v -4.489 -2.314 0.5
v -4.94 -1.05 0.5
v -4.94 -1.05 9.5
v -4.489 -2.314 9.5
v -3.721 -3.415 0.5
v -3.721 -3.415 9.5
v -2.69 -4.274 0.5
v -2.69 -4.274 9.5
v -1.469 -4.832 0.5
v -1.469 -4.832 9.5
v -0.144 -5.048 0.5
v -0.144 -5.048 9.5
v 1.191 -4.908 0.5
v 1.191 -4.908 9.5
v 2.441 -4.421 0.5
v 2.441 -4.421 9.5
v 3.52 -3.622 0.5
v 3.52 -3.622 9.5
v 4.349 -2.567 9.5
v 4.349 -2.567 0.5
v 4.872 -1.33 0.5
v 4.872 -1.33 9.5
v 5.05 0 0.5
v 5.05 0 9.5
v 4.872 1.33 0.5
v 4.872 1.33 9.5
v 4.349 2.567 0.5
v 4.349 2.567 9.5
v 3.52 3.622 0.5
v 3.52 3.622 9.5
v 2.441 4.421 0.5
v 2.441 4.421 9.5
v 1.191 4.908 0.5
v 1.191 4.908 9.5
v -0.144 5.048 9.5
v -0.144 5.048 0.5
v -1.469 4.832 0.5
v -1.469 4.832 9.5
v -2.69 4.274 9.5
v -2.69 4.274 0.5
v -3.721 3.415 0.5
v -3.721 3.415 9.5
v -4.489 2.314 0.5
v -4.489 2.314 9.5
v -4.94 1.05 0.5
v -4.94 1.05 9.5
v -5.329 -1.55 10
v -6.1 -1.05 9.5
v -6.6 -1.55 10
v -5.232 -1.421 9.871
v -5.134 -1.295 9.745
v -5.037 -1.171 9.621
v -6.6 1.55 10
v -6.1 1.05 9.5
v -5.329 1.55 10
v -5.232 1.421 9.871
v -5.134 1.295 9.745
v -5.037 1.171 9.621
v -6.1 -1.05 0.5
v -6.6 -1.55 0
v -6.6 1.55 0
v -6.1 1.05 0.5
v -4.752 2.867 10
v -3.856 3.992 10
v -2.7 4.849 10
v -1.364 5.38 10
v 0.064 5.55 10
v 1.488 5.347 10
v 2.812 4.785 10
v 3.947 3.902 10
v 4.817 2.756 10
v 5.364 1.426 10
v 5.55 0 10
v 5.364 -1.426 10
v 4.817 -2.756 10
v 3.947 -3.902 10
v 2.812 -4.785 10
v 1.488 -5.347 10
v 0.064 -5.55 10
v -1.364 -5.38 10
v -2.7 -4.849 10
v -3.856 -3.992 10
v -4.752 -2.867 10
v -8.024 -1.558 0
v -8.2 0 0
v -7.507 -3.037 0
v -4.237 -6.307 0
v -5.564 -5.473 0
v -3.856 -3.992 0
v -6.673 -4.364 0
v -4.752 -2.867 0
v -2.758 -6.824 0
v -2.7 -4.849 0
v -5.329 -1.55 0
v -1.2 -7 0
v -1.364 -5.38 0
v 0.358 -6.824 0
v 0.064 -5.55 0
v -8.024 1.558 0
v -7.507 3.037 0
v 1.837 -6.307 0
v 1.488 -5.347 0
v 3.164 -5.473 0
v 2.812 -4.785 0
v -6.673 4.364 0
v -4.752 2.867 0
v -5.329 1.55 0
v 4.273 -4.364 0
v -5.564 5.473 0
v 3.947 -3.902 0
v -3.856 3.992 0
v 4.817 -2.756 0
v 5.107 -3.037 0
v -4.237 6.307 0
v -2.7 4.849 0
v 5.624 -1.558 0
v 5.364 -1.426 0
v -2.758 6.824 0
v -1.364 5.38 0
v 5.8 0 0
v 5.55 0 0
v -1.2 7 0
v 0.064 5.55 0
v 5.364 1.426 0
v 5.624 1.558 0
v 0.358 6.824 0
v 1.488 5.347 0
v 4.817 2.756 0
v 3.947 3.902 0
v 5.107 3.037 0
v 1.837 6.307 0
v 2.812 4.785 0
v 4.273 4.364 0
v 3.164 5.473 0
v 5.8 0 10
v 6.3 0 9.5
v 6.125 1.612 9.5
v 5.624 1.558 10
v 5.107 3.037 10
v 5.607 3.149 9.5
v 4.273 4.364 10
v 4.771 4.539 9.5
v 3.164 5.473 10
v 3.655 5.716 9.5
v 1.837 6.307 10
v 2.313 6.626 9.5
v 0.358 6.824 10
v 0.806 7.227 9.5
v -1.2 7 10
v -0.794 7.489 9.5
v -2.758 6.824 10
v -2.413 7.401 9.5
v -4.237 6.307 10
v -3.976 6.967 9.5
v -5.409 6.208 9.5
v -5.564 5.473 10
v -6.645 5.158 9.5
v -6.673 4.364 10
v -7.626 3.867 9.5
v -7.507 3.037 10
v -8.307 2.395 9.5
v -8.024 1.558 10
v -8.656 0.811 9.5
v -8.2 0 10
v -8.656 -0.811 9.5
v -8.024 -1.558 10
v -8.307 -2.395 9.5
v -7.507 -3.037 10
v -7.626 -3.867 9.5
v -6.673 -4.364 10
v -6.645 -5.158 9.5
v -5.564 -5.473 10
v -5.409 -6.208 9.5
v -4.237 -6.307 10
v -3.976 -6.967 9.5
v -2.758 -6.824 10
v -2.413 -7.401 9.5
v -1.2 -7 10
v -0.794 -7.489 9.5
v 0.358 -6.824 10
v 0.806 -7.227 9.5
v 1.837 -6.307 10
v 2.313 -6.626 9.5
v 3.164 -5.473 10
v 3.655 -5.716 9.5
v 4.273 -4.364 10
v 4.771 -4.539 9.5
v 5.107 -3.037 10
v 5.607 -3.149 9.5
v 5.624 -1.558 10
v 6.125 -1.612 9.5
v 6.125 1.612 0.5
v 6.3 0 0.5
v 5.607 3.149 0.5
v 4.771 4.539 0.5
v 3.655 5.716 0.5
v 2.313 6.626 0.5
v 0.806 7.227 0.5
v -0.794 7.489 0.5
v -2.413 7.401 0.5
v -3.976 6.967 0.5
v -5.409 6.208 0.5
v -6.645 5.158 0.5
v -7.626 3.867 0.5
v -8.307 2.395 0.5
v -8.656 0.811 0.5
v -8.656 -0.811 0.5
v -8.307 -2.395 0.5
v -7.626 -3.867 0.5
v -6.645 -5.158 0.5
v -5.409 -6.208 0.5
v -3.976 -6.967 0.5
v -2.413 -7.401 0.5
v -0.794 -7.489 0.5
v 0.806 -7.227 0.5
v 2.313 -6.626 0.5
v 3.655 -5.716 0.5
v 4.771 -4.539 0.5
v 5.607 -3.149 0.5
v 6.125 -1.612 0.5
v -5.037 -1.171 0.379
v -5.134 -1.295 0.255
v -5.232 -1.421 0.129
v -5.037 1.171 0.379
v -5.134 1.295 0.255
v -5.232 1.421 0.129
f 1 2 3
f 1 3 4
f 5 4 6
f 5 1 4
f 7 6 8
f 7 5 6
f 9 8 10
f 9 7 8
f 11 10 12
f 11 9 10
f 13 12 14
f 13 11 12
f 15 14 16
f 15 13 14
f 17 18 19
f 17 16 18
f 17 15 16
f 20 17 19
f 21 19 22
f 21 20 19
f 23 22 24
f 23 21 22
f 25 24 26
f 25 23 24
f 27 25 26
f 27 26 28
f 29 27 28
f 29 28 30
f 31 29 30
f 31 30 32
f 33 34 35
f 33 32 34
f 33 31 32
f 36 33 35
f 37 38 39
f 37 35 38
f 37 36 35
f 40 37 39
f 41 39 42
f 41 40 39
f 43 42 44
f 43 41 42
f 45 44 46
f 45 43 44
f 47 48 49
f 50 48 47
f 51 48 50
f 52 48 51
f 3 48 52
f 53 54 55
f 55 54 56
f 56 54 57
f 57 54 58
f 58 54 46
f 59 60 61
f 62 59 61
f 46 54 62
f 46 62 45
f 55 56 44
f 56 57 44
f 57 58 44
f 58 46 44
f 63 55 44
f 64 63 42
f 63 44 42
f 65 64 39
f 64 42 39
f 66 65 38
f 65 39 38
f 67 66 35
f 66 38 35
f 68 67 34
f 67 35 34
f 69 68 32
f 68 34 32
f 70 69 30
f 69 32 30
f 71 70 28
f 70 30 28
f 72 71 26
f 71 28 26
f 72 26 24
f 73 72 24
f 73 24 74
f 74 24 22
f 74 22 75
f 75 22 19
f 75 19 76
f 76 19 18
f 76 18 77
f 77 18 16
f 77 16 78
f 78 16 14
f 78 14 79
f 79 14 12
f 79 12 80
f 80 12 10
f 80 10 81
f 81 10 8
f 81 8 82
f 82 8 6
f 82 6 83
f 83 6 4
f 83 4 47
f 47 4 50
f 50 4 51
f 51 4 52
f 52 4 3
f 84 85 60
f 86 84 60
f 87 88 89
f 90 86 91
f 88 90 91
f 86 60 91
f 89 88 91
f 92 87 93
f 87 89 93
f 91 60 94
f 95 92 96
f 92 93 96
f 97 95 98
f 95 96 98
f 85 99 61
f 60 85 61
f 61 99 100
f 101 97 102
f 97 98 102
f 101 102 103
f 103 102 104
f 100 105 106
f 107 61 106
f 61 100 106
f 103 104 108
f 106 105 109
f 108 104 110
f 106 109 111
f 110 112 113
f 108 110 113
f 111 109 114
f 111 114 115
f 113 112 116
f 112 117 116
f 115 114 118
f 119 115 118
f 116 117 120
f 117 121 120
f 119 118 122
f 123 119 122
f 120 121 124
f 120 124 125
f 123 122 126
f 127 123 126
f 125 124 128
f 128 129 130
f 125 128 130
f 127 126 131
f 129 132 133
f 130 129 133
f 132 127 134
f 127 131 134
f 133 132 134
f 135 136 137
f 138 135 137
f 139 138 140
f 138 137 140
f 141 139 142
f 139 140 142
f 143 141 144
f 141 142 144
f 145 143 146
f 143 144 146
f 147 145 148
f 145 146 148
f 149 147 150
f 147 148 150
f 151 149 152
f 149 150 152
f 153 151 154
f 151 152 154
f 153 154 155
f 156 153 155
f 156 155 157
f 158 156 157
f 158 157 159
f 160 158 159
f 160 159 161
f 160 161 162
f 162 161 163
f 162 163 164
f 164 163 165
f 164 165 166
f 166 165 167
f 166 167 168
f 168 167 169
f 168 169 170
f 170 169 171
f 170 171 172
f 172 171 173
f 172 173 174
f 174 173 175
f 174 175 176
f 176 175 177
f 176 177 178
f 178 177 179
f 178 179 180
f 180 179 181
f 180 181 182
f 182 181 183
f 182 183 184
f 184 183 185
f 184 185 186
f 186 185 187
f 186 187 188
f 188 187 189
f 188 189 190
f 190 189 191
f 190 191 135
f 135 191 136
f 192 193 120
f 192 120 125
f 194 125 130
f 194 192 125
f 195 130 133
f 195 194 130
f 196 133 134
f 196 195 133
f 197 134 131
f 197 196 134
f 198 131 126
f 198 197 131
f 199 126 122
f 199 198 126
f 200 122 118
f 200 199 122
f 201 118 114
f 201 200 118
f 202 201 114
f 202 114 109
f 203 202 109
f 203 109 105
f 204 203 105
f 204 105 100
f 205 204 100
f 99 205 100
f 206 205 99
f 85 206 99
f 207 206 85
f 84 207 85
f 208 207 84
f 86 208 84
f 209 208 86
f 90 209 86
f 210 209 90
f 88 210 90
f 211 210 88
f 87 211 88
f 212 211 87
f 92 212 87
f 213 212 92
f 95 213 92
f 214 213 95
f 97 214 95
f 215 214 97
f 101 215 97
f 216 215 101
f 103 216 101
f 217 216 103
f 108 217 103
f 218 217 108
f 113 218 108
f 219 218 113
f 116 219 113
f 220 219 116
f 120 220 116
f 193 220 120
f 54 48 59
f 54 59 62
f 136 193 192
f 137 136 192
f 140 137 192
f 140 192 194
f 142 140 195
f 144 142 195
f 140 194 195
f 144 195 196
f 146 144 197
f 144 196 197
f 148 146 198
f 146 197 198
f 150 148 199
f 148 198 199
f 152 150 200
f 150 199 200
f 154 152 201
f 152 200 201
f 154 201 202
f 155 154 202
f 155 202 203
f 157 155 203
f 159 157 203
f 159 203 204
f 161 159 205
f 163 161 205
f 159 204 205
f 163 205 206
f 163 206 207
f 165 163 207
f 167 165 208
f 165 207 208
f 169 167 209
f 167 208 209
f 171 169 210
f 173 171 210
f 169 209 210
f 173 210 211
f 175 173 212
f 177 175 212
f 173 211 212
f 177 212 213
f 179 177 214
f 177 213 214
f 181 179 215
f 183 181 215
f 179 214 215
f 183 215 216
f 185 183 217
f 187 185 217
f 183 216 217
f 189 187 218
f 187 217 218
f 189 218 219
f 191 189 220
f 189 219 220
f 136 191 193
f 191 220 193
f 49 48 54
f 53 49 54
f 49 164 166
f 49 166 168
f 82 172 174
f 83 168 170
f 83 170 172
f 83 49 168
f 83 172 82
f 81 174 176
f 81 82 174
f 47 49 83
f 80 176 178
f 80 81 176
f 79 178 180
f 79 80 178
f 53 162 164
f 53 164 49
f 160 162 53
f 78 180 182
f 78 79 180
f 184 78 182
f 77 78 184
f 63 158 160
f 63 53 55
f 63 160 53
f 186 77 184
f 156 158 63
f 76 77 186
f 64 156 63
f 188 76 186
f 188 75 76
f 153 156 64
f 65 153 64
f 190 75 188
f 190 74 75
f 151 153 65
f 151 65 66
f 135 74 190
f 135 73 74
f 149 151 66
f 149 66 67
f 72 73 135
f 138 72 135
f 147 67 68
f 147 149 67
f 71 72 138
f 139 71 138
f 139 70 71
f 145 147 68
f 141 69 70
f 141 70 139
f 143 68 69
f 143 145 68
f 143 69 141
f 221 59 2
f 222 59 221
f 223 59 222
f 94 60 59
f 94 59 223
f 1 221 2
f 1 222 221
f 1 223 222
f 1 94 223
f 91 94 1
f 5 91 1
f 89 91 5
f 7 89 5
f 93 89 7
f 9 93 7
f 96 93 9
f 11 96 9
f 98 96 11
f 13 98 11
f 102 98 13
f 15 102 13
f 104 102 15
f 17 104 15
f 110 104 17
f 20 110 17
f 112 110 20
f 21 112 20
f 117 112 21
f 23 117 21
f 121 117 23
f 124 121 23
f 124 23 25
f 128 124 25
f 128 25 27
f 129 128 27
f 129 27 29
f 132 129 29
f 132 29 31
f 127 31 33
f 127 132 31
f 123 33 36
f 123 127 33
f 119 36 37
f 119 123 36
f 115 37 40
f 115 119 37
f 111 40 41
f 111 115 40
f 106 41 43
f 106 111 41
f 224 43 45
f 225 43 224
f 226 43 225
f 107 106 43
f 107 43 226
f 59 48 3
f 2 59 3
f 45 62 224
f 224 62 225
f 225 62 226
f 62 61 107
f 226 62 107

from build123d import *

# Parameters (mm, degrees)
SKETCH1_R           = 7.5
SKETCH1_R_2         = 5.05
BOSS_EXTRUDE1_DEPTH = 10
SKETCH2_W           = 6.1
SKETCH2_H           = 2.1
CUT_EXTRUDE1_DEPTH  = 16.229576488
CHAMFER1_SIZE       = 0.5
CHAMFER2_SIZE       = 0.5
CHAMFER3_SIZE       = 0.5


with BuildPart() as part:
    # Sketch1 → Boss-Extrude1 (new body)
    with BuildSketch(Plane.XY):
        with Locations((-1.2, 0)):
            Circle(SKETCH1_R)
        Circle(SKETCH1_R_2, mode=Mode.SUBTRACT)
    extrude(amount=BOSS_EXTRUDE1_DEPTH)

    # Sketch2 → Cut-Extrude1 (cut, through all)
    with BuildSketch(Plane.XY.offset(10)):
        with Locations((-3.05, 0)):
            Rectangle(SKETCH2_W, SKETCH2_H)
    extrude(amount=-CUT_EXTRUDE1_DEPTH, mode=Mode.SUBTRACT)

    # Chamfer1
    chamfer1_edges = [part.edges().sort_by_distance(p)[0] for p in [
        (5.05, 0, 10),
        (-5.519817807, -1.05, 10),
        (-5.519817807, 1.05, 10),
        (-6.1, 0, 10),
    ]]
    chamfer(chamfer1_edges, length=CHAMFER1_SIZE)

    # Chamfer2
    chamfer2_edges = [part.edges().sort_by_distance(p)[0] for p in [
        (5.05, 0, 0),
        (-5.519817807, -1.05, 0),
        (-6.1, 0, 0),
        (-5.519817807, 1.05, 0),
    ]]
    chamfer(chamfer2_edges, length=CHAMFER2_SIZE)

    # Chamfer3
    chamfer3_edges = [part.edges().sort_by_distance(p)[0] for p in [
        (-8.7, 0, 0),
        (-8.7, 0, 10),
    ]]
    chamfer(chamfer3_edges, length=CHAMFER3_SIZE)


solid = part.part
